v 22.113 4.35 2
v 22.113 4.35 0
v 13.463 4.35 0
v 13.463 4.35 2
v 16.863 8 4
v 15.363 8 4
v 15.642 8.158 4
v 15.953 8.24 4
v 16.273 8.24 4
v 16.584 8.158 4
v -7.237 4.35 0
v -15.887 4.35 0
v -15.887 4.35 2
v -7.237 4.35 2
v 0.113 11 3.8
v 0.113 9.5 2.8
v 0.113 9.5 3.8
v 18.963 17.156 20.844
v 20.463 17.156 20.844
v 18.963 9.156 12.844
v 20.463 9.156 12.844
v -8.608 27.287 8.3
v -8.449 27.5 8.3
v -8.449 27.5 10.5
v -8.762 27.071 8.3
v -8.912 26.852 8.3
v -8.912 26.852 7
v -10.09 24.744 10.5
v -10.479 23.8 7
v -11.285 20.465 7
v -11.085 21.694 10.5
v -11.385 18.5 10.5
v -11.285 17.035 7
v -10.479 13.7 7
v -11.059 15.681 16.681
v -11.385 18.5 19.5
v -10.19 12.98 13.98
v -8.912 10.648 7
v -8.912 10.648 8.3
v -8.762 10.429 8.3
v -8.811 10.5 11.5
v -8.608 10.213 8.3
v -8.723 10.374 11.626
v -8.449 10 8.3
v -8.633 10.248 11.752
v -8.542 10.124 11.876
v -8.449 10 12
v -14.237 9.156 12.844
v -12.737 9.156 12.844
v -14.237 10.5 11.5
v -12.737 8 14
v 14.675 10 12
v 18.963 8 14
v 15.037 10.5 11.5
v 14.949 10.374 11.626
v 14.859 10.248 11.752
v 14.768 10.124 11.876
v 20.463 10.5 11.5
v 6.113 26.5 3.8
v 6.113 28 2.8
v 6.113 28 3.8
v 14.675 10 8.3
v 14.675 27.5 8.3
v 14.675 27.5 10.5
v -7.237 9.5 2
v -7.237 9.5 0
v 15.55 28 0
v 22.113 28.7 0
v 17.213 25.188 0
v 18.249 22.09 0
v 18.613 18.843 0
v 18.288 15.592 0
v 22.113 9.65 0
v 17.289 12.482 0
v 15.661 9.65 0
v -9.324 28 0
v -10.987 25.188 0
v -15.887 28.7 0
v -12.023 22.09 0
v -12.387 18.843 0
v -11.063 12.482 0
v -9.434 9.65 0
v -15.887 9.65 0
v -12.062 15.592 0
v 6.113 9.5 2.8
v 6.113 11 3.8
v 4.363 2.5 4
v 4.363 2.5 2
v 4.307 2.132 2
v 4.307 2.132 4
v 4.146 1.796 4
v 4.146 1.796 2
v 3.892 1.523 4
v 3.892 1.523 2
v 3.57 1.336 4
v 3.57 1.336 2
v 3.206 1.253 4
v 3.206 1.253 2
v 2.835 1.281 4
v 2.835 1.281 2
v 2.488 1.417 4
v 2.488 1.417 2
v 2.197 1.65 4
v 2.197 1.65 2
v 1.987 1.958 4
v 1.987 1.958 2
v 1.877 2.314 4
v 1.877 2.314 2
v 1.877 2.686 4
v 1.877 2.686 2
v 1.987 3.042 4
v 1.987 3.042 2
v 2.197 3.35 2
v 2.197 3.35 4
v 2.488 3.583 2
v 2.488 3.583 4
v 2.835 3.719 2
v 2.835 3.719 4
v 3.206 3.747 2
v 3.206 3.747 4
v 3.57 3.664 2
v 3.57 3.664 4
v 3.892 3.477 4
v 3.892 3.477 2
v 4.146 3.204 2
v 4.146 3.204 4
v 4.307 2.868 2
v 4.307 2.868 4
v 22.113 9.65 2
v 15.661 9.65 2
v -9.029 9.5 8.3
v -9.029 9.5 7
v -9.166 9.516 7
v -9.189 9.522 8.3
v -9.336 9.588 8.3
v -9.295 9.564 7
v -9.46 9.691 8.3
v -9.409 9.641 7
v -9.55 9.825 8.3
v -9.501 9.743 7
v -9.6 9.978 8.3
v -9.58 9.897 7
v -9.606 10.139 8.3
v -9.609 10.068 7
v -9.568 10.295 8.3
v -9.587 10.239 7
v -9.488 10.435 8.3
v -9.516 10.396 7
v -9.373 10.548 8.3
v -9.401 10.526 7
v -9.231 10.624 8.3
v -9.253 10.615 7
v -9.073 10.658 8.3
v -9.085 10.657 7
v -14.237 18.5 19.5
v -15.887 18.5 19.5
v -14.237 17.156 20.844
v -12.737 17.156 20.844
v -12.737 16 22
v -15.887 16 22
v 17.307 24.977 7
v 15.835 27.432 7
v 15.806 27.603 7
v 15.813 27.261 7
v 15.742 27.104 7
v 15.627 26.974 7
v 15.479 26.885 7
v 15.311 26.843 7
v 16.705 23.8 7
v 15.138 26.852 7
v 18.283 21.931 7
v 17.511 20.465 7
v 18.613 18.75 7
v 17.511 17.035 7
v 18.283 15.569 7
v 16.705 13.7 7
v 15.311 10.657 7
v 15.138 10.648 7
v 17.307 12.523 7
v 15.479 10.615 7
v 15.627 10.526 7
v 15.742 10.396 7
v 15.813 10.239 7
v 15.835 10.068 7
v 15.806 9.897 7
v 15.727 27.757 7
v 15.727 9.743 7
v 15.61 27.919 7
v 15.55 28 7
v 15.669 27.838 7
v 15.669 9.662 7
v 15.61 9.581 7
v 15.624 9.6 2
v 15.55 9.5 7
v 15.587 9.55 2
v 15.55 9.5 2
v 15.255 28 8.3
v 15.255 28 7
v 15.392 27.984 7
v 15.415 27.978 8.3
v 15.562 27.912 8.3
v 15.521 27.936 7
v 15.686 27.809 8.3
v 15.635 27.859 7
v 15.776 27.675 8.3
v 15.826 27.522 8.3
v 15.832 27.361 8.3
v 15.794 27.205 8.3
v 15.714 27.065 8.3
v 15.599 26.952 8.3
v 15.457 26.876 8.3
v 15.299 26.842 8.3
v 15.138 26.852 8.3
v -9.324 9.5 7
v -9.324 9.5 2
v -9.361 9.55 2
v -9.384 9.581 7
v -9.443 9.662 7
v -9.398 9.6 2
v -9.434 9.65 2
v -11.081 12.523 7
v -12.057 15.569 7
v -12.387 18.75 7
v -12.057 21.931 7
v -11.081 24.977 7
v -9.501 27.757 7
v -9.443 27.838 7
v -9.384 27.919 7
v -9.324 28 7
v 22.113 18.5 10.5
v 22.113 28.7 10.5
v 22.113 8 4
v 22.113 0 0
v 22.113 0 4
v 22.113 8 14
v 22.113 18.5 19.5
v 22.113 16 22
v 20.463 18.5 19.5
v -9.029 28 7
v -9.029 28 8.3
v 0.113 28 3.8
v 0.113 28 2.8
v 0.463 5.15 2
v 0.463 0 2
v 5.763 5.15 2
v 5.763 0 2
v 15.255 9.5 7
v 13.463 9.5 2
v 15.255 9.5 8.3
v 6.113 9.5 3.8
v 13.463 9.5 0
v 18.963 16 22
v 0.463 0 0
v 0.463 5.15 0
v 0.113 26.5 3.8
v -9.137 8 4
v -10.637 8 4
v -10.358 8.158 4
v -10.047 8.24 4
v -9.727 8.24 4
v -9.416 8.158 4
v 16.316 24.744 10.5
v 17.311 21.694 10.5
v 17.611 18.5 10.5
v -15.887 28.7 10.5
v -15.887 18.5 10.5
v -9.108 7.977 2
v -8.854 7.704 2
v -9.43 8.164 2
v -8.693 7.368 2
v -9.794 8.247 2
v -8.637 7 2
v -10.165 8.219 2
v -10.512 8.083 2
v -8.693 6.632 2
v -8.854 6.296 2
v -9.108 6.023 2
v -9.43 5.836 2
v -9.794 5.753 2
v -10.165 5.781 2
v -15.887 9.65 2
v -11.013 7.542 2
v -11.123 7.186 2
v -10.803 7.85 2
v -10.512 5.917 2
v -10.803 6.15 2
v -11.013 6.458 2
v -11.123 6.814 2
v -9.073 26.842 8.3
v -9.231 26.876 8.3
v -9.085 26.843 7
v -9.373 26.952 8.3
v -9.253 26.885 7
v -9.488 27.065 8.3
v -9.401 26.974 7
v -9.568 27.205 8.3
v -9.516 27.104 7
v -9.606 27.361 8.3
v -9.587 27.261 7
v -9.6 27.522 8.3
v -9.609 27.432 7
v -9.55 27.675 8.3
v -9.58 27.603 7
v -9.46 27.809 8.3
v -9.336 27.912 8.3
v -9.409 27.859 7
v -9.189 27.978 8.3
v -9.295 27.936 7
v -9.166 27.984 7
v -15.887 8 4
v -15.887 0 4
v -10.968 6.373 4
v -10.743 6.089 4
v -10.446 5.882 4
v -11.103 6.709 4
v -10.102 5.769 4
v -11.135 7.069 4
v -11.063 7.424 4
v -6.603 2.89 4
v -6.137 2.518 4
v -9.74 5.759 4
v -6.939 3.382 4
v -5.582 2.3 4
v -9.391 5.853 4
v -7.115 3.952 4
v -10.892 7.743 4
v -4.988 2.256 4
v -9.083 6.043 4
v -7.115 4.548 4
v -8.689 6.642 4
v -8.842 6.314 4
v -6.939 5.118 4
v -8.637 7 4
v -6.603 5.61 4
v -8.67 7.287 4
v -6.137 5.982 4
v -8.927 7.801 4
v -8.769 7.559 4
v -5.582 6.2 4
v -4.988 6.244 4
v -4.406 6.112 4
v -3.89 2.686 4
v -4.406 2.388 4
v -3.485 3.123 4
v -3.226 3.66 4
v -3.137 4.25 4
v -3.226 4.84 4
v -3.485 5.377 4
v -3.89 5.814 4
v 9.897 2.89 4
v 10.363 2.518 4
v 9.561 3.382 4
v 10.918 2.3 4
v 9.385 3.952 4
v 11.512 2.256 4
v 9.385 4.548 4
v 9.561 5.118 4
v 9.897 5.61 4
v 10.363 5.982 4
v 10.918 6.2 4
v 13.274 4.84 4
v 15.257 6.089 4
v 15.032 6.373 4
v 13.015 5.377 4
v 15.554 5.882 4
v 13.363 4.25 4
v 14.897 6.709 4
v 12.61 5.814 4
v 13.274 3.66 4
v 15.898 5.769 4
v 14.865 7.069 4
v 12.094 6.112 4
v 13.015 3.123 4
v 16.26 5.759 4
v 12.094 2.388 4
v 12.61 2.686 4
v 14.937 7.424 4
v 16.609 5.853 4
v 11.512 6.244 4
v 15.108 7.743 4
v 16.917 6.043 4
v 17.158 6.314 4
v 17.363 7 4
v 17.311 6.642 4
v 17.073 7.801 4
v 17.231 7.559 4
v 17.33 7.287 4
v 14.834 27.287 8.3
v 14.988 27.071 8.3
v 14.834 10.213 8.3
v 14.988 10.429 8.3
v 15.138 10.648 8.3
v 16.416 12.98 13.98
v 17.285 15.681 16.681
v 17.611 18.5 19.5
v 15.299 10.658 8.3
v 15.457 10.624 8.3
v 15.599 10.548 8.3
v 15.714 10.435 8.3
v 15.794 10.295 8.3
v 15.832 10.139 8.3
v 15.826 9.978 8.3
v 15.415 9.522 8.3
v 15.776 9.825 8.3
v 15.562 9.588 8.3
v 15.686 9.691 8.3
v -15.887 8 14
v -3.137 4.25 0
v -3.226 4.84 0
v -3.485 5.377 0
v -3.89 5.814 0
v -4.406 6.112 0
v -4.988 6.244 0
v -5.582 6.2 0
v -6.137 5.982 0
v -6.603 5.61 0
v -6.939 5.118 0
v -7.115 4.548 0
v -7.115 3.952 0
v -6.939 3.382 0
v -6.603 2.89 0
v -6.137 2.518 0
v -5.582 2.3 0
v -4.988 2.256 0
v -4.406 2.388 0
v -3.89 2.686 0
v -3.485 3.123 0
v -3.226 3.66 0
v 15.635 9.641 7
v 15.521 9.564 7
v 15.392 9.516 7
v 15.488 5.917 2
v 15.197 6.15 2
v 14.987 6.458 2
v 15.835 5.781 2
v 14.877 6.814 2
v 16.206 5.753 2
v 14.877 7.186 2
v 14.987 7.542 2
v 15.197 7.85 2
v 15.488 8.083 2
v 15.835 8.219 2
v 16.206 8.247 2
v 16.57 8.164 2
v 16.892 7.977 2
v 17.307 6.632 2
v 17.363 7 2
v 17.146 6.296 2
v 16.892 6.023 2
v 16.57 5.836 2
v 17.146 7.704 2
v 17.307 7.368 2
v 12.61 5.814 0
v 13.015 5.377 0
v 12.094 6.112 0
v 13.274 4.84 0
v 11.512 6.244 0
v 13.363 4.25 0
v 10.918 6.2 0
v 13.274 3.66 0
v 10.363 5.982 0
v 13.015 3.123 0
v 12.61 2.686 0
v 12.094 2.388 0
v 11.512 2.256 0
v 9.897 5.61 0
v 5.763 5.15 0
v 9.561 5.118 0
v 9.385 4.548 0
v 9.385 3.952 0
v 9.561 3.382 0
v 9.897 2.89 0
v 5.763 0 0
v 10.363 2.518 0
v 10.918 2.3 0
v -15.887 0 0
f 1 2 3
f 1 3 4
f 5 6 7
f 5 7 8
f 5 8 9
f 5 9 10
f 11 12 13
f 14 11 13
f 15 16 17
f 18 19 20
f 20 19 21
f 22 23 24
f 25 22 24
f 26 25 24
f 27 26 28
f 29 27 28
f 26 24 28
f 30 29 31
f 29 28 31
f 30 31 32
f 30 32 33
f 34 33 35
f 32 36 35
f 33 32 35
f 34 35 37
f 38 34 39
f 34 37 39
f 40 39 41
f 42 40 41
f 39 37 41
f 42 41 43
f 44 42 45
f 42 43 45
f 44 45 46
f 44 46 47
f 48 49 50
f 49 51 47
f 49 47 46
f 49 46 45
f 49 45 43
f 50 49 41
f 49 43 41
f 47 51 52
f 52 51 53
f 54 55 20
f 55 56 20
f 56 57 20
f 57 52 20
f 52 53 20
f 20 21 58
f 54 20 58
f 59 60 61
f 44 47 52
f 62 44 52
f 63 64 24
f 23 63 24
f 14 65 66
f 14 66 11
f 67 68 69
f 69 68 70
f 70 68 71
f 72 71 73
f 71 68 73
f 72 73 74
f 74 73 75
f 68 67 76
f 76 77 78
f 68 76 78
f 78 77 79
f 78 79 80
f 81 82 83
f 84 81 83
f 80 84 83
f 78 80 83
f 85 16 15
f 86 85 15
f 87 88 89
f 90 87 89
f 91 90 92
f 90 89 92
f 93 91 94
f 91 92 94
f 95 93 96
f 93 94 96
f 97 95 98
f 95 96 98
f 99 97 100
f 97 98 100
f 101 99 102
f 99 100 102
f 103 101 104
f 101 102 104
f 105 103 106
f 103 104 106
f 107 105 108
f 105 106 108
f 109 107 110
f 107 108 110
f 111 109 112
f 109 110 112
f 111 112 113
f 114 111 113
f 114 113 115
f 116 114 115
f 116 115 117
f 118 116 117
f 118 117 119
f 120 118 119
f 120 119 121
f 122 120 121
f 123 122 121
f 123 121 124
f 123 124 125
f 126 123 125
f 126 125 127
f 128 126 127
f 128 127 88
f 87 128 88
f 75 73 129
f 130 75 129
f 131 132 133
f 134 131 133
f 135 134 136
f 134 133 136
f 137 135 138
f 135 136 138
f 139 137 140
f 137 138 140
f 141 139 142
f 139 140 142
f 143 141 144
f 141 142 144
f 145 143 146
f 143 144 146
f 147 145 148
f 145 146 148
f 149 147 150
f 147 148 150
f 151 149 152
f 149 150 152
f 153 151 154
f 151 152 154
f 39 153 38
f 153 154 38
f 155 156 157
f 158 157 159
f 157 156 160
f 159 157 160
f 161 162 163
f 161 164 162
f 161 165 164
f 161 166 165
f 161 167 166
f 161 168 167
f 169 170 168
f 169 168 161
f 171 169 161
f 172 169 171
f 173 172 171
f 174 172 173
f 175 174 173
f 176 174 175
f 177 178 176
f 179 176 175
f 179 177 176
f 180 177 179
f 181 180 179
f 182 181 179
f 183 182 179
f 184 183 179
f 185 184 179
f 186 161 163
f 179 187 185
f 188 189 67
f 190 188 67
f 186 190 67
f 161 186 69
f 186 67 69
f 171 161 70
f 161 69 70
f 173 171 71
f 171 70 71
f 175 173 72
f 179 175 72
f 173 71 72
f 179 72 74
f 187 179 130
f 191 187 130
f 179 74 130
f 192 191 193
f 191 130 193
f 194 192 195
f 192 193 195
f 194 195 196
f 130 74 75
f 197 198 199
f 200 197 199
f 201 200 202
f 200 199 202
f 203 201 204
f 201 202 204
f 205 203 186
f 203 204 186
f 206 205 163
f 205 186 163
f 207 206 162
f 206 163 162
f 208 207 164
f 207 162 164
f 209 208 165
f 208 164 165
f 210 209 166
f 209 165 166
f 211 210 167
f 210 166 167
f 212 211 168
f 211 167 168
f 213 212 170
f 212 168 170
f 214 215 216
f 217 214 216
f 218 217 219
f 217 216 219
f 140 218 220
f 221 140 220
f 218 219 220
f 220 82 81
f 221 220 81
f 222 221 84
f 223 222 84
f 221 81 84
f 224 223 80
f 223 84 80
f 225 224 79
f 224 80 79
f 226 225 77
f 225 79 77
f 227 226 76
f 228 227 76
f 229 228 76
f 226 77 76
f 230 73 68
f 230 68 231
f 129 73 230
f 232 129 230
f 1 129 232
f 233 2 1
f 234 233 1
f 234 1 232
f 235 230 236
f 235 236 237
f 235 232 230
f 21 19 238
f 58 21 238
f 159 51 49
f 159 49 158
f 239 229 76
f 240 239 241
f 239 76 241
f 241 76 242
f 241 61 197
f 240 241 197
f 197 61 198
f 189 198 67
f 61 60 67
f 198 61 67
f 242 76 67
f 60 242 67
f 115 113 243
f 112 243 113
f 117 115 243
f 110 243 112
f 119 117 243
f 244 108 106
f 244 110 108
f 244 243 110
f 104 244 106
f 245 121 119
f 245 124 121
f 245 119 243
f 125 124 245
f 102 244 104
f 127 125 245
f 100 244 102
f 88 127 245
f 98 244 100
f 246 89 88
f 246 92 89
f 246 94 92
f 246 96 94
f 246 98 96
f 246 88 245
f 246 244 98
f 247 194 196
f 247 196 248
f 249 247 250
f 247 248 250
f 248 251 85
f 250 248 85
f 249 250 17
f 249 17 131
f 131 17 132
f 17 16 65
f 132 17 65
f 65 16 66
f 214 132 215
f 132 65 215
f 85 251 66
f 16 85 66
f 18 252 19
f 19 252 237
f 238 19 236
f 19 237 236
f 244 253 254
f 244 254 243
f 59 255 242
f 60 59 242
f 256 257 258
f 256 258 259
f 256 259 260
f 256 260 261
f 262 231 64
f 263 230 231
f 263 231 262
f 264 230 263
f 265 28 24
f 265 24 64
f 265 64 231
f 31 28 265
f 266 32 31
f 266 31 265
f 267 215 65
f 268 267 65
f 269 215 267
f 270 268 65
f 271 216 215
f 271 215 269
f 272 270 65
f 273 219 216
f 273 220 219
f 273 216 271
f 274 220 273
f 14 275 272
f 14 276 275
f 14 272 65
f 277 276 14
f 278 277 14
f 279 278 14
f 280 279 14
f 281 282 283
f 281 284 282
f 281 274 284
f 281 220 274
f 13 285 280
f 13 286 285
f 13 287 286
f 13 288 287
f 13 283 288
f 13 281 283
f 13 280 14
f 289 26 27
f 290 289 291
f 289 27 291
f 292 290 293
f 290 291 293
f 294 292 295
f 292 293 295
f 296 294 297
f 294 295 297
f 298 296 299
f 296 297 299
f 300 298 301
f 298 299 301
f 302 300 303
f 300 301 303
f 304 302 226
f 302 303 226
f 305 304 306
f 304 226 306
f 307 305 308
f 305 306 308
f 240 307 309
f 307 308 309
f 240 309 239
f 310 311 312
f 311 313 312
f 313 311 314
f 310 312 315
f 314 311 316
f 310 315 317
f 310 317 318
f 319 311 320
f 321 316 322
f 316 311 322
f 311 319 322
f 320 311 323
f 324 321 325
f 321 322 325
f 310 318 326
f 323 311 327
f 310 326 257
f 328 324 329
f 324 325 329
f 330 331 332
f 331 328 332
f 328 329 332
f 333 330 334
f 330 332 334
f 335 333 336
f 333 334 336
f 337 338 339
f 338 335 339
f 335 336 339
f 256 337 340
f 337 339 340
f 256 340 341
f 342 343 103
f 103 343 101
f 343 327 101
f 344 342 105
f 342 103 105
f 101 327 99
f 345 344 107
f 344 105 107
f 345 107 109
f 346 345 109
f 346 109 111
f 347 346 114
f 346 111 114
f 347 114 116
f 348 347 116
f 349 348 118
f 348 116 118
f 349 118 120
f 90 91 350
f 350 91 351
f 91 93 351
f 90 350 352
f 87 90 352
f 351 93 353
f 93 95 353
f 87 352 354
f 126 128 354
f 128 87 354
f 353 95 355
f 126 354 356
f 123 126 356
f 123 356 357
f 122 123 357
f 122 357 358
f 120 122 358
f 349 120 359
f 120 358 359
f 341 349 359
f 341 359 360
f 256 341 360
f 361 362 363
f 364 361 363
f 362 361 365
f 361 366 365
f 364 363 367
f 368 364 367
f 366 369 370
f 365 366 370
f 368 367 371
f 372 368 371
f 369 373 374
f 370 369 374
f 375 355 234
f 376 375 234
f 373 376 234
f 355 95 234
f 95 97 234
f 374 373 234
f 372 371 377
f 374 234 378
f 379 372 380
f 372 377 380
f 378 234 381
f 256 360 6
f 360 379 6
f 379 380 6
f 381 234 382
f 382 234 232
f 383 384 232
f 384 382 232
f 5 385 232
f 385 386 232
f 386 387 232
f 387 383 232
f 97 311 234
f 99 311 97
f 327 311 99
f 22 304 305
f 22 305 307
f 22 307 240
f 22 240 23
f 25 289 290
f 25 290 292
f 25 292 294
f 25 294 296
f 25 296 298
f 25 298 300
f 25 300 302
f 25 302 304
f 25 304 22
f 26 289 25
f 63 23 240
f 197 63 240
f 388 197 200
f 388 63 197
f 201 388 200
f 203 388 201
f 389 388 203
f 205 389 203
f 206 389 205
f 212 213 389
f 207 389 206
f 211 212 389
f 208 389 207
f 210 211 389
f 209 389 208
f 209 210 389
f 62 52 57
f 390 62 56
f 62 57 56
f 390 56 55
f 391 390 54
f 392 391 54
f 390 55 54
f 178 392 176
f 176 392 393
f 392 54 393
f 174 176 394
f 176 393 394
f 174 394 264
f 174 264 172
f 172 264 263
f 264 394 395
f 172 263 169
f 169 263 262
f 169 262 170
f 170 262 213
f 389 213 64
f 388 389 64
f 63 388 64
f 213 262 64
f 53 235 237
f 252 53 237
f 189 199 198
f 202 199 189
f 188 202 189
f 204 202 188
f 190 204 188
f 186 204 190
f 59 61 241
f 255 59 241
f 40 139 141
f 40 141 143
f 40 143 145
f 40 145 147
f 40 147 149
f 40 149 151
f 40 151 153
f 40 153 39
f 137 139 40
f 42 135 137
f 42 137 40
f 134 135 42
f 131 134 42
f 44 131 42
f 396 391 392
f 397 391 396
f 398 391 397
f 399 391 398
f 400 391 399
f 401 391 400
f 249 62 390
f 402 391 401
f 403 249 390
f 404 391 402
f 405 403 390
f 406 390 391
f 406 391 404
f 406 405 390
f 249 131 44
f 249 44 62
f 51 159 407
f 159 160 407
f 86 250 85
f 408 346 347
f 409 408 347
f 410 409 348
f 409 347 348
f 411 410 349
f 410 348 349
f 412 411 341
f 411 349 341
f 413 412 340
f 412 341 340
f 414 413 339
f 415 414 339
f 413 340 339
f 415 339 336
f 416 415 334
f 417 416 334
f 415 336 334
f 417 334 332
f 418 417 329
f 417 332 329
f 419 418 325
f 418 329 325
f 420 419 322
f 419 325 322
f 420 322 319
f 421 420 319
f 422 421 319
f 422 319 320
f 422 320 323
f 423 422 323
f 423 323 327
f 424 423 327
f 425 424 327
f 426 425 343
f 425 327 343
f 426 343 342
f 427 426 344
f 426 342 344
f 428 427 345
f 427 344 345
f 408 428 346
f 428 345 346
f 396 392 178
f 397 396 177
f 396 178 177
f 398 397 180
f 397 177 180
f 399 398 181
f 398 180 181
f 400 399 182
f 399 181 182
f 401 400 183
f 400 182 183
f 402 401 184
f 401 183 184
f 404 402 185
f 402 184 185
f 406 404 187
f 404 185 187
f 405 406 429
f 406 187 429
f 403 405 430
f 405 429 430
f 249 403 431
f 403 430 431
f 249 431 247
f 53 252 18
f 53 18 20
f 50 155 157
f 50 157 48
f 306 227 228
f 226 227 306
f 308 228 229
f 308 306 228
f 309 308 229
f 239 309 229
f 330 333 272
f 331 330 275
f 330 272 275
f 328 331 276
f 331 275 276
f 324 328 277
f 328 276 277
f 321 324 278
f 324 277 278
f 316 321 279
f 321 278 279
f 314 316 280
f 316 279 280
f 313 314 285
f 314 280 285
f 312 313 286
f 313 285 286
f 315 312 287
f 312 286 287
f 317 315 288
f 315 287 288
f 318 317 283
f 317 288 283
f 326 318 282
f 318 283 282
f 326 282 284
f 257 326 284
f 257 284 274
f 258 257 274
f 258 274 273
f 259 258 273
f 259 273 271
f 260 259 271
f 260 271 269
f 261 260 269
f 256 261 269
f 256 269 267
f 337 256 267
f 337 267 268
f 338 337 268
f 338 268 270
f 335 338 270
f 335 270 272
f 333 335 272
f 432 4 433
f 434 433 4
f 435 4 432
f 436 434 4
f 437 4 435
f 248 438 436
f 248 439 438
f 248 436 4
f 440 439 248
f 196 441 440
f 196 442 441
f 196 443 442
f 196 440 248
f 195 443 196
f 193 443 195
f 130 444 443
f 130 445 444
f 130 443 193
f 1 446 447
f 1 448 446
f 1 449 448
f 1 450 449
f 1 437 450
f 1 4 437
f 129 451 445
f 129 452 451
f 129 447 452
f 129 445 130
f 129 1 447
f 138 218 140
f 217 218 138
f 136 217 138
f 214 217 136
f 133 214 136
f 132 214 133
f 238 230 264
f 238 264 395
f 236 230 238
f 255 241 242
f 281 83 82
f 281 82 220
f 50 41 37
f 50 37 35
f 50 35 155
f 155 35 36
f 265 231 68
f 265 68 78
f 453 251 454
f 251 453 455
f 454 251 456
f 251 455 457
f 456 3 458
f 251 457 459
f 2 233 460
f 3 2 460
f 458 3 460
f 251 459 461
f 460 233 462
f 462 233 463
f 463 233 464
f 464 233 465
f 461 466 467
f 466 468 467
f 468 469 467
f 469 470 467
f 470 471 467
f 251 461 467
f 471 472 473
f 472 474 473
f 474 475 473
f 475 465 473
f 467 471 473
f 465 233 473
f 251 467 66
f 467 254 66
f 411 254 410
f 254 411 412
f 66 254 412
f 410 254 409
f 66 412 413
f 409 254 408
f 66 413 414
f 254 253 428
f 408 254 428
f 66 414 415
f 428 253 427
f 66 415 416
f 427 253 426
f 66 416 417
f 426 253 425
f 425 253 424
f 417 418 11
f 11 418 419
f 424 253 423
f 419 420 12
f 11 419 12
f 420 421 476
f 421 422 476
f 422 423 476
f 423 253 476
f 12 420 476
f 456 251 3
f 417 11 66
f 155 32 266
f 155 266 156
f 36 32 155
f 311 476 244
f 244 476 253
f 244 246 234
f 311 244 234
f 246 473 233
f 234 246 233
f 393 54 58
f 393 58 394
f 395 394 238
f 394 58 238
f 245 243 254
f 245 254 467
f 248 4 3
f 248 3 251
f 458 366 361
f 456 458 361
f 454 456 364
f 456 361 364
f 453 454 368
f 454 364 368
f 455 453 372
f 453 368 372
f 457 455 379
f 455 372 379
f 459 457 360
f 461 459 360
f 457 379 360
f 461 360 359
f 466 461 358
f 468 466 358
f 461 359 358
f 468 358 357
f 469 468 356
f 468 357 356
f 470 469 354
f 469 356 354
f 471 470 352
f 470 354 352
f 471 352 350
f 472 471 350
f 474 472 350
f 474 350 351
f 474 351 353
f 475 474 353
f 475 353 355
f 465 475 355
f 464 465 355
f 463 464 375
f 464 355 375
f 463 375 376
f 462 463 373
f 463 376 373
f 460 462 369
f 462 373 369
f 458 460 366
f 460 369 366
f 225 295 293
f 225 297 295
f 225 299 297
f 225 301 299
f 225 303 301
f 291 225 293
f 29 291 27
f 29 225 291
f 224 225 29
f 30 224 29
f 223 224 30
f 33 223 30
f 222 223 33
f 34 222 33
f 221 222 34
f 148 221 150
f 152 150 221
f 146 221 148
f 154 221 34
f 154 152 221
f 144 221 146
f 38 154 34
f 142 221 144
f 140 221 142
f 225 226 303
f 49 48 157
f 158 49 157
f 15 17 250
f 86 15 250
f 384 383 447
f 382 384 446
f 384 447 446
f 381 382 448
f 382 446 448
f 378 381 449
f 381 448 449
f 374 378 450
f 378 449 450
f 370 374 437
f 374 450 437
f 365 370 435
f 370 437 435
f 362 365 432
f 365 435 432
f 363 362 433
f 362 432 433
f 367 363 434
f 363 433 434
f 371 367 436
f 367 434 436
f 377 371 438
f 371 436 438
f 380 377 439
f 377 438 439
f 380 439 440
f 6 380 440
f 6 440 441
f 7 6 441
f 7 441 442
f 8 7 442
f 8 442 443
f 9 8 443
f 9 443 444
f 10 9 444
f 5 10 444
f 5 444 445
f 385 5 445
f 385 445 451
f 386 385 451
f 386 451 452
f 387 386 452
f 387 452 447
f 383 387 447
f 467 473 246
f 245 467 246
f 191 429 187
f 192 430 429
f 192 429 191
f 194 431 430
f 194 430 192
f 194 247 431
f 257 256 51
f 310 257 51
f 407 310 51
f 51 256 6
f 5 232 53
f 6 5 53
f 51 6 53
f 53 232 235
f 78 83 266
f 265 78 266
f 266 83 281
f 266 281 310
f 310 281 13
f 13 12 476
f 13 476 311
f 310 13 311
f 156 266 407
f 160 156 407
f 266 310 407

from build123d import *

# Parameters (mm, degrees)
F0_W      = 38
F0_H      = 28.5
F1_DEPTH  = 19.5
F2_W      = 8
F2_H      = 15.5
F4_DEPTH  = 38
F6_DEPTH  = 19.5
F3_W      = 10
F3_H      = 9
F7_DEPTH  = 38
F9_DEPTH  = 38
F11_DEPTH = 7
F12_R     = 2
F13_DEPTH = 4
F15_DEPTH = 1.65
F17_DEPTH = 1.5
F19_DEPTH = 1.65
F21_DEPTH = 1.5
F23_DEPTH = 1.5
F25_DEPTH = 6
F27_DEPTH = 1.5
F29_DEPTH = 6
F30_W     = 38
F30_H     = 10.5
F31_DEPTH = 0.2
F33_DEPTH = 1.3
F34_R     = 1.25
F35_DEPTH = 4
F36_W     = 5.3
F36_H     = 2
F37_DEPTH = 8.65
F38_W     = 5.3
F38_H     = 2
F39_DEPTH = 8.65
F40_W     = 5.3
F40_H     = 2
F41_DEPTH = 5.15


with BuildPart() as f1:
    # F0 (on Top) → F1 (new body)
    with BuildSketch(Plane.XY):
        with Locations((3.11301895, 14.25)):
            Rectangle(F0_W, F0_H)
    extrude(amount=F1_DEPTH)

    # F2 (on face) → F4 (cut)
    with BuildSketch(Plane.YZ.offset(22.11301895)):
        with Locations((4, 11.75)):
            Rectangle(F2_W, F2_H)
    extrude(amount=-F4_DEPTH, mode=Mode.SUBTRACT)

    # F5 (on face) → F6 (cut)
    with BuildSketch(Plane.XY.offset(19.5)):
        with BuildLine():
            ThreePointArc((-8.4493121299, 27.5), (-11.38698105, 18.75), (-8.4493121299, 10))
            Line((-8.4493121299, 10), (14.6753500298, 10))
            ThreePointArc((14.6753500298, 10), (17.61301895, 18.75), (14.6753500298, 27.5))
            Line((14.6753500298, 27.5), (-8.4493121299, 27.5))
        make_face()
    extrude(amount=-F6_DEPTH, mode=Mode.SUBTRACT)

    # F3 (on face) → F7 (cut)
    with BuildSketch(Plane.YZ.offset(22.11301895)):
        with Locations((23.5, 15)):
            Rectangle(F3_W, F3_H)
    extrude(amount=-F7_DEPTH, mode=Mode.SUBTRACT)

    # F8 (on face) → F9 (cut)
    with BuildSketch(Plane.YZ.offset(22.11301895)):
        Polygon((18.5, 19.5), (8, 19.5), (8, 14), (10.5, 11.5), align=None)
    extrude(amount=-F9_DEPTH, mode=Mode.SUBTRACT)

    # F10 (on face) → F11 (cut)
    with BuildSketch(Plane(origin=(0, 0, 0), x_dir=(1, 0, 0), z_dir=(0, 0, -1))):
        with BuildLine():
            Line((15.5503619138, -9.5), (-9.3243240138, -9.5))
            ThreePointArc((-9.3243240138, -9.5), (-12.38698105, -18.75), (-9.3243240138, -28))
            Line((-9.3243240138, -28), (15.5503619138, -28))
            ThreePointArc((15.5503619138, -28), (18.61301895, -18.75), (15.5503619138, -9.5))
        make_face()
    extrude(amount=-F11_DEPTH, mode=Mode.SUBTRACT)

    # F12 (on face) → F13 (cut)
    with BuildSketch(Plane.XY.offset(4)):
        with Locations((-5.13698105, 4.25)):
            Circle(F12_R)
        with Locations((11.36301895, 4.25)):
            Circle(F12_R)
    extrude(amount=-F13_DEPTH, mode=Mode.SUBTRACT)

    # F14 (on face) → F15 (join)
    with BuildSketch(Plane.YZ.offset(22.11301895)):
        Polygon((8, 14), (10.5, 11.5), (18.5, 19.5), (16, 22), align=None)
    extrude(amount=-F15_DEPTH)

    # F16 (on face) → F17 (join)
    with BuildSketch(Plane(origin=(20.46301895, 0, 0), x_dir=(0, -1, 0), z_dir=(-1, 0, 0))):
        Polygon((-9.1564971157, 12.8435028843), (-8, 14), (-16, 22), (-17.1564971157, 20.8435028843), align=None)
    extrude(amount=F17_DEPTH)

    # F18 (on face) → F19 (join)
    with BuildSketch(Plane(origin=(-15.88698105, 0, 0), x_dir=(0, -1, 0), z_dir=(-1, 0, 0))):
        Polygon((-18.5, 19.5), (-10.5, 11.5), (-8, 14), (-16, 22), align=None)
    extrude(amount=-F19_DEPTH)

    # F20 (on face) → F21 (join)
    with BuildSketch(Plane.YZ.offset(-14.23698105)):
        Polygon((17.1564971157, 20.8435028843), (16, 22), (8, 14), (9.1564971157, 12.8435028843), align=None)
    extrude(amount=F21_DEPTH)

    # F22 (on face) → F23 (join)
    with BuildSketch(Plane(origin=(0, 9.5, 0), x_dir=(-1, 0, 0), z_dir=(0, 1, 0))):
        Polygon((-0.11301895, 3.8), (-3.11301895, 3.8), (-6.11301895, 3.8), (-6.11301895, 2.8), (-0.11301895, 2.8), align=None)
    extrude(amount=F23_DEPTH)

    # F24 (on face) → F25 (cut)
    with BuildSketch(Plane(origin=(0.11301895, 0, 0), x_dir=(0, -1, 0), z_dir=(-1, 0, 0))):
        Polygon((-11, 2.8), (-9.5, 2.8), (-11, 3.8), align=None)
    extrude(amount=-F25_DEPTH, mode=Mode.SUBTRACT)

    # F26 (on face) → F27 (join)
    with BuildSketch(Plane.XZ.offset(-28)):
        Polygon((6.11301895, 3.8), (3.11301895, 3.8), (0.11301895, 3.8), (0.11301895, 2.8), (6.11301895, 2.8), align=None)
    extrude(amount=F27_DEPTH)

    # F28 (on face) → F29 (cut)
    with BuildSketch(Plane(origin=(0.11301895, 0, 0), x_dir=(0, -1, 0), z_dir=(-1, 0, 0))):
        Polygon((-26.5, 3.8), (-28, 2.8), (-26.5, 2.8), align=None)
    extrude(amount=-F29_DEPTH, mode=Mode.SUBTRACT)

    # F30 (on face) → F31 (join)
    with BuildSketch(Plane(origin=(0, 28.5, 0), x_dir=(-1, 0, 0), z_dir=(0, 1, 0))):
        with Locations((-3.11301895, 5.25)):
            Rectangle(F30_W, F30_H)
    extrude(amount=F31_DEPTH)

    # F32 (on face) → F33 (cut)
    with BuildSketch(Plane(origin=(0, 0, 7), x_dir=(1, 0, 0), z_dir=(0, 0, -1))):
        with BuildLine():
            ThreePointArc((-9.0293473605, -9.5), (-9.4394942054, -10.4901820755), (-8.4493121299, -10.0800352306))
            Line((-8.4493121299, -10.0800352306), (-8.4493121299, -27.4199647694))
            ThreePointArc((-8.4493121299, -27.4199647694), (-9.4394942054, -27.0098179245), (-9.0293473605, -28))
            Line((-9.0293473605, -28), (15.2553852604, -28))
            ThreePointArc((15.2553852604, -28), (15.6655321053, -27.0098179245), (14.6753500298, -27.4199647694))
            Line((14.6753500298, -27.4199647694), (14.6753500298, -10.0800352306))
            ThreePointArc((14.6753500298, -10.0800352306), (15.6655321053, -10.4901820755), (15.2553852604, -9.5))
            Line((15.2553852604, -9.5), (-9.0293473605, -9.5))
        make_face()
    extrude(amount=-F33_DEPTH, mode=Mode.SUBTRACT)

    # F34 (on face) → F35 (cut)
    with BuildSketch(Plane(origin=(0, 0, 0), x_dir=(1, 0, 0), z_dir=(0, 0, -1))):
        with Locations((-9.88698105, -7)):
            Circle(F34_R)
        with Locations((16.11301895, -7)):
            Circle(F34_R)
        with Locations((3.11301895, -2.5)):
            Circle(F34_R)
    extrude(amount=-F35_DEPTH, mode=Mode.SUBTRACT)

    # F36 (on face) → F37 (cut)
    with BuildSketch(Plane(origin=(-15.88698105, 0, 0), x_dir=(0, -1, 0), z_dir=(-1, 0, 0))):
        with Locations((-7, 1)):
            Rectangle(F36_W, F36_H)
    extrude(amount=-F37_DEPTH, mode=Mode.SUBTRACT)

    # F38 (on face) → F39 (cut)
    with BuildSketch(Plane.YZ.offset(22.11301895)):
        with Locations((7, 1)):
            Rectangle(F38_W, F38_H)
    extrude(amount=-F39_DEPTH, mode=Mode.SUBTRACT)

    # F40 (on face) → F41 (cut)
    with BuildSketch(Plane.XZ):
        with Locations((3.11301895, 1)):
            Rectangle(F40_W, F40_H)
    extrude(amount=-F41_DEPTH, mode=Mode.SUBTRACT)


solid = f1.part
